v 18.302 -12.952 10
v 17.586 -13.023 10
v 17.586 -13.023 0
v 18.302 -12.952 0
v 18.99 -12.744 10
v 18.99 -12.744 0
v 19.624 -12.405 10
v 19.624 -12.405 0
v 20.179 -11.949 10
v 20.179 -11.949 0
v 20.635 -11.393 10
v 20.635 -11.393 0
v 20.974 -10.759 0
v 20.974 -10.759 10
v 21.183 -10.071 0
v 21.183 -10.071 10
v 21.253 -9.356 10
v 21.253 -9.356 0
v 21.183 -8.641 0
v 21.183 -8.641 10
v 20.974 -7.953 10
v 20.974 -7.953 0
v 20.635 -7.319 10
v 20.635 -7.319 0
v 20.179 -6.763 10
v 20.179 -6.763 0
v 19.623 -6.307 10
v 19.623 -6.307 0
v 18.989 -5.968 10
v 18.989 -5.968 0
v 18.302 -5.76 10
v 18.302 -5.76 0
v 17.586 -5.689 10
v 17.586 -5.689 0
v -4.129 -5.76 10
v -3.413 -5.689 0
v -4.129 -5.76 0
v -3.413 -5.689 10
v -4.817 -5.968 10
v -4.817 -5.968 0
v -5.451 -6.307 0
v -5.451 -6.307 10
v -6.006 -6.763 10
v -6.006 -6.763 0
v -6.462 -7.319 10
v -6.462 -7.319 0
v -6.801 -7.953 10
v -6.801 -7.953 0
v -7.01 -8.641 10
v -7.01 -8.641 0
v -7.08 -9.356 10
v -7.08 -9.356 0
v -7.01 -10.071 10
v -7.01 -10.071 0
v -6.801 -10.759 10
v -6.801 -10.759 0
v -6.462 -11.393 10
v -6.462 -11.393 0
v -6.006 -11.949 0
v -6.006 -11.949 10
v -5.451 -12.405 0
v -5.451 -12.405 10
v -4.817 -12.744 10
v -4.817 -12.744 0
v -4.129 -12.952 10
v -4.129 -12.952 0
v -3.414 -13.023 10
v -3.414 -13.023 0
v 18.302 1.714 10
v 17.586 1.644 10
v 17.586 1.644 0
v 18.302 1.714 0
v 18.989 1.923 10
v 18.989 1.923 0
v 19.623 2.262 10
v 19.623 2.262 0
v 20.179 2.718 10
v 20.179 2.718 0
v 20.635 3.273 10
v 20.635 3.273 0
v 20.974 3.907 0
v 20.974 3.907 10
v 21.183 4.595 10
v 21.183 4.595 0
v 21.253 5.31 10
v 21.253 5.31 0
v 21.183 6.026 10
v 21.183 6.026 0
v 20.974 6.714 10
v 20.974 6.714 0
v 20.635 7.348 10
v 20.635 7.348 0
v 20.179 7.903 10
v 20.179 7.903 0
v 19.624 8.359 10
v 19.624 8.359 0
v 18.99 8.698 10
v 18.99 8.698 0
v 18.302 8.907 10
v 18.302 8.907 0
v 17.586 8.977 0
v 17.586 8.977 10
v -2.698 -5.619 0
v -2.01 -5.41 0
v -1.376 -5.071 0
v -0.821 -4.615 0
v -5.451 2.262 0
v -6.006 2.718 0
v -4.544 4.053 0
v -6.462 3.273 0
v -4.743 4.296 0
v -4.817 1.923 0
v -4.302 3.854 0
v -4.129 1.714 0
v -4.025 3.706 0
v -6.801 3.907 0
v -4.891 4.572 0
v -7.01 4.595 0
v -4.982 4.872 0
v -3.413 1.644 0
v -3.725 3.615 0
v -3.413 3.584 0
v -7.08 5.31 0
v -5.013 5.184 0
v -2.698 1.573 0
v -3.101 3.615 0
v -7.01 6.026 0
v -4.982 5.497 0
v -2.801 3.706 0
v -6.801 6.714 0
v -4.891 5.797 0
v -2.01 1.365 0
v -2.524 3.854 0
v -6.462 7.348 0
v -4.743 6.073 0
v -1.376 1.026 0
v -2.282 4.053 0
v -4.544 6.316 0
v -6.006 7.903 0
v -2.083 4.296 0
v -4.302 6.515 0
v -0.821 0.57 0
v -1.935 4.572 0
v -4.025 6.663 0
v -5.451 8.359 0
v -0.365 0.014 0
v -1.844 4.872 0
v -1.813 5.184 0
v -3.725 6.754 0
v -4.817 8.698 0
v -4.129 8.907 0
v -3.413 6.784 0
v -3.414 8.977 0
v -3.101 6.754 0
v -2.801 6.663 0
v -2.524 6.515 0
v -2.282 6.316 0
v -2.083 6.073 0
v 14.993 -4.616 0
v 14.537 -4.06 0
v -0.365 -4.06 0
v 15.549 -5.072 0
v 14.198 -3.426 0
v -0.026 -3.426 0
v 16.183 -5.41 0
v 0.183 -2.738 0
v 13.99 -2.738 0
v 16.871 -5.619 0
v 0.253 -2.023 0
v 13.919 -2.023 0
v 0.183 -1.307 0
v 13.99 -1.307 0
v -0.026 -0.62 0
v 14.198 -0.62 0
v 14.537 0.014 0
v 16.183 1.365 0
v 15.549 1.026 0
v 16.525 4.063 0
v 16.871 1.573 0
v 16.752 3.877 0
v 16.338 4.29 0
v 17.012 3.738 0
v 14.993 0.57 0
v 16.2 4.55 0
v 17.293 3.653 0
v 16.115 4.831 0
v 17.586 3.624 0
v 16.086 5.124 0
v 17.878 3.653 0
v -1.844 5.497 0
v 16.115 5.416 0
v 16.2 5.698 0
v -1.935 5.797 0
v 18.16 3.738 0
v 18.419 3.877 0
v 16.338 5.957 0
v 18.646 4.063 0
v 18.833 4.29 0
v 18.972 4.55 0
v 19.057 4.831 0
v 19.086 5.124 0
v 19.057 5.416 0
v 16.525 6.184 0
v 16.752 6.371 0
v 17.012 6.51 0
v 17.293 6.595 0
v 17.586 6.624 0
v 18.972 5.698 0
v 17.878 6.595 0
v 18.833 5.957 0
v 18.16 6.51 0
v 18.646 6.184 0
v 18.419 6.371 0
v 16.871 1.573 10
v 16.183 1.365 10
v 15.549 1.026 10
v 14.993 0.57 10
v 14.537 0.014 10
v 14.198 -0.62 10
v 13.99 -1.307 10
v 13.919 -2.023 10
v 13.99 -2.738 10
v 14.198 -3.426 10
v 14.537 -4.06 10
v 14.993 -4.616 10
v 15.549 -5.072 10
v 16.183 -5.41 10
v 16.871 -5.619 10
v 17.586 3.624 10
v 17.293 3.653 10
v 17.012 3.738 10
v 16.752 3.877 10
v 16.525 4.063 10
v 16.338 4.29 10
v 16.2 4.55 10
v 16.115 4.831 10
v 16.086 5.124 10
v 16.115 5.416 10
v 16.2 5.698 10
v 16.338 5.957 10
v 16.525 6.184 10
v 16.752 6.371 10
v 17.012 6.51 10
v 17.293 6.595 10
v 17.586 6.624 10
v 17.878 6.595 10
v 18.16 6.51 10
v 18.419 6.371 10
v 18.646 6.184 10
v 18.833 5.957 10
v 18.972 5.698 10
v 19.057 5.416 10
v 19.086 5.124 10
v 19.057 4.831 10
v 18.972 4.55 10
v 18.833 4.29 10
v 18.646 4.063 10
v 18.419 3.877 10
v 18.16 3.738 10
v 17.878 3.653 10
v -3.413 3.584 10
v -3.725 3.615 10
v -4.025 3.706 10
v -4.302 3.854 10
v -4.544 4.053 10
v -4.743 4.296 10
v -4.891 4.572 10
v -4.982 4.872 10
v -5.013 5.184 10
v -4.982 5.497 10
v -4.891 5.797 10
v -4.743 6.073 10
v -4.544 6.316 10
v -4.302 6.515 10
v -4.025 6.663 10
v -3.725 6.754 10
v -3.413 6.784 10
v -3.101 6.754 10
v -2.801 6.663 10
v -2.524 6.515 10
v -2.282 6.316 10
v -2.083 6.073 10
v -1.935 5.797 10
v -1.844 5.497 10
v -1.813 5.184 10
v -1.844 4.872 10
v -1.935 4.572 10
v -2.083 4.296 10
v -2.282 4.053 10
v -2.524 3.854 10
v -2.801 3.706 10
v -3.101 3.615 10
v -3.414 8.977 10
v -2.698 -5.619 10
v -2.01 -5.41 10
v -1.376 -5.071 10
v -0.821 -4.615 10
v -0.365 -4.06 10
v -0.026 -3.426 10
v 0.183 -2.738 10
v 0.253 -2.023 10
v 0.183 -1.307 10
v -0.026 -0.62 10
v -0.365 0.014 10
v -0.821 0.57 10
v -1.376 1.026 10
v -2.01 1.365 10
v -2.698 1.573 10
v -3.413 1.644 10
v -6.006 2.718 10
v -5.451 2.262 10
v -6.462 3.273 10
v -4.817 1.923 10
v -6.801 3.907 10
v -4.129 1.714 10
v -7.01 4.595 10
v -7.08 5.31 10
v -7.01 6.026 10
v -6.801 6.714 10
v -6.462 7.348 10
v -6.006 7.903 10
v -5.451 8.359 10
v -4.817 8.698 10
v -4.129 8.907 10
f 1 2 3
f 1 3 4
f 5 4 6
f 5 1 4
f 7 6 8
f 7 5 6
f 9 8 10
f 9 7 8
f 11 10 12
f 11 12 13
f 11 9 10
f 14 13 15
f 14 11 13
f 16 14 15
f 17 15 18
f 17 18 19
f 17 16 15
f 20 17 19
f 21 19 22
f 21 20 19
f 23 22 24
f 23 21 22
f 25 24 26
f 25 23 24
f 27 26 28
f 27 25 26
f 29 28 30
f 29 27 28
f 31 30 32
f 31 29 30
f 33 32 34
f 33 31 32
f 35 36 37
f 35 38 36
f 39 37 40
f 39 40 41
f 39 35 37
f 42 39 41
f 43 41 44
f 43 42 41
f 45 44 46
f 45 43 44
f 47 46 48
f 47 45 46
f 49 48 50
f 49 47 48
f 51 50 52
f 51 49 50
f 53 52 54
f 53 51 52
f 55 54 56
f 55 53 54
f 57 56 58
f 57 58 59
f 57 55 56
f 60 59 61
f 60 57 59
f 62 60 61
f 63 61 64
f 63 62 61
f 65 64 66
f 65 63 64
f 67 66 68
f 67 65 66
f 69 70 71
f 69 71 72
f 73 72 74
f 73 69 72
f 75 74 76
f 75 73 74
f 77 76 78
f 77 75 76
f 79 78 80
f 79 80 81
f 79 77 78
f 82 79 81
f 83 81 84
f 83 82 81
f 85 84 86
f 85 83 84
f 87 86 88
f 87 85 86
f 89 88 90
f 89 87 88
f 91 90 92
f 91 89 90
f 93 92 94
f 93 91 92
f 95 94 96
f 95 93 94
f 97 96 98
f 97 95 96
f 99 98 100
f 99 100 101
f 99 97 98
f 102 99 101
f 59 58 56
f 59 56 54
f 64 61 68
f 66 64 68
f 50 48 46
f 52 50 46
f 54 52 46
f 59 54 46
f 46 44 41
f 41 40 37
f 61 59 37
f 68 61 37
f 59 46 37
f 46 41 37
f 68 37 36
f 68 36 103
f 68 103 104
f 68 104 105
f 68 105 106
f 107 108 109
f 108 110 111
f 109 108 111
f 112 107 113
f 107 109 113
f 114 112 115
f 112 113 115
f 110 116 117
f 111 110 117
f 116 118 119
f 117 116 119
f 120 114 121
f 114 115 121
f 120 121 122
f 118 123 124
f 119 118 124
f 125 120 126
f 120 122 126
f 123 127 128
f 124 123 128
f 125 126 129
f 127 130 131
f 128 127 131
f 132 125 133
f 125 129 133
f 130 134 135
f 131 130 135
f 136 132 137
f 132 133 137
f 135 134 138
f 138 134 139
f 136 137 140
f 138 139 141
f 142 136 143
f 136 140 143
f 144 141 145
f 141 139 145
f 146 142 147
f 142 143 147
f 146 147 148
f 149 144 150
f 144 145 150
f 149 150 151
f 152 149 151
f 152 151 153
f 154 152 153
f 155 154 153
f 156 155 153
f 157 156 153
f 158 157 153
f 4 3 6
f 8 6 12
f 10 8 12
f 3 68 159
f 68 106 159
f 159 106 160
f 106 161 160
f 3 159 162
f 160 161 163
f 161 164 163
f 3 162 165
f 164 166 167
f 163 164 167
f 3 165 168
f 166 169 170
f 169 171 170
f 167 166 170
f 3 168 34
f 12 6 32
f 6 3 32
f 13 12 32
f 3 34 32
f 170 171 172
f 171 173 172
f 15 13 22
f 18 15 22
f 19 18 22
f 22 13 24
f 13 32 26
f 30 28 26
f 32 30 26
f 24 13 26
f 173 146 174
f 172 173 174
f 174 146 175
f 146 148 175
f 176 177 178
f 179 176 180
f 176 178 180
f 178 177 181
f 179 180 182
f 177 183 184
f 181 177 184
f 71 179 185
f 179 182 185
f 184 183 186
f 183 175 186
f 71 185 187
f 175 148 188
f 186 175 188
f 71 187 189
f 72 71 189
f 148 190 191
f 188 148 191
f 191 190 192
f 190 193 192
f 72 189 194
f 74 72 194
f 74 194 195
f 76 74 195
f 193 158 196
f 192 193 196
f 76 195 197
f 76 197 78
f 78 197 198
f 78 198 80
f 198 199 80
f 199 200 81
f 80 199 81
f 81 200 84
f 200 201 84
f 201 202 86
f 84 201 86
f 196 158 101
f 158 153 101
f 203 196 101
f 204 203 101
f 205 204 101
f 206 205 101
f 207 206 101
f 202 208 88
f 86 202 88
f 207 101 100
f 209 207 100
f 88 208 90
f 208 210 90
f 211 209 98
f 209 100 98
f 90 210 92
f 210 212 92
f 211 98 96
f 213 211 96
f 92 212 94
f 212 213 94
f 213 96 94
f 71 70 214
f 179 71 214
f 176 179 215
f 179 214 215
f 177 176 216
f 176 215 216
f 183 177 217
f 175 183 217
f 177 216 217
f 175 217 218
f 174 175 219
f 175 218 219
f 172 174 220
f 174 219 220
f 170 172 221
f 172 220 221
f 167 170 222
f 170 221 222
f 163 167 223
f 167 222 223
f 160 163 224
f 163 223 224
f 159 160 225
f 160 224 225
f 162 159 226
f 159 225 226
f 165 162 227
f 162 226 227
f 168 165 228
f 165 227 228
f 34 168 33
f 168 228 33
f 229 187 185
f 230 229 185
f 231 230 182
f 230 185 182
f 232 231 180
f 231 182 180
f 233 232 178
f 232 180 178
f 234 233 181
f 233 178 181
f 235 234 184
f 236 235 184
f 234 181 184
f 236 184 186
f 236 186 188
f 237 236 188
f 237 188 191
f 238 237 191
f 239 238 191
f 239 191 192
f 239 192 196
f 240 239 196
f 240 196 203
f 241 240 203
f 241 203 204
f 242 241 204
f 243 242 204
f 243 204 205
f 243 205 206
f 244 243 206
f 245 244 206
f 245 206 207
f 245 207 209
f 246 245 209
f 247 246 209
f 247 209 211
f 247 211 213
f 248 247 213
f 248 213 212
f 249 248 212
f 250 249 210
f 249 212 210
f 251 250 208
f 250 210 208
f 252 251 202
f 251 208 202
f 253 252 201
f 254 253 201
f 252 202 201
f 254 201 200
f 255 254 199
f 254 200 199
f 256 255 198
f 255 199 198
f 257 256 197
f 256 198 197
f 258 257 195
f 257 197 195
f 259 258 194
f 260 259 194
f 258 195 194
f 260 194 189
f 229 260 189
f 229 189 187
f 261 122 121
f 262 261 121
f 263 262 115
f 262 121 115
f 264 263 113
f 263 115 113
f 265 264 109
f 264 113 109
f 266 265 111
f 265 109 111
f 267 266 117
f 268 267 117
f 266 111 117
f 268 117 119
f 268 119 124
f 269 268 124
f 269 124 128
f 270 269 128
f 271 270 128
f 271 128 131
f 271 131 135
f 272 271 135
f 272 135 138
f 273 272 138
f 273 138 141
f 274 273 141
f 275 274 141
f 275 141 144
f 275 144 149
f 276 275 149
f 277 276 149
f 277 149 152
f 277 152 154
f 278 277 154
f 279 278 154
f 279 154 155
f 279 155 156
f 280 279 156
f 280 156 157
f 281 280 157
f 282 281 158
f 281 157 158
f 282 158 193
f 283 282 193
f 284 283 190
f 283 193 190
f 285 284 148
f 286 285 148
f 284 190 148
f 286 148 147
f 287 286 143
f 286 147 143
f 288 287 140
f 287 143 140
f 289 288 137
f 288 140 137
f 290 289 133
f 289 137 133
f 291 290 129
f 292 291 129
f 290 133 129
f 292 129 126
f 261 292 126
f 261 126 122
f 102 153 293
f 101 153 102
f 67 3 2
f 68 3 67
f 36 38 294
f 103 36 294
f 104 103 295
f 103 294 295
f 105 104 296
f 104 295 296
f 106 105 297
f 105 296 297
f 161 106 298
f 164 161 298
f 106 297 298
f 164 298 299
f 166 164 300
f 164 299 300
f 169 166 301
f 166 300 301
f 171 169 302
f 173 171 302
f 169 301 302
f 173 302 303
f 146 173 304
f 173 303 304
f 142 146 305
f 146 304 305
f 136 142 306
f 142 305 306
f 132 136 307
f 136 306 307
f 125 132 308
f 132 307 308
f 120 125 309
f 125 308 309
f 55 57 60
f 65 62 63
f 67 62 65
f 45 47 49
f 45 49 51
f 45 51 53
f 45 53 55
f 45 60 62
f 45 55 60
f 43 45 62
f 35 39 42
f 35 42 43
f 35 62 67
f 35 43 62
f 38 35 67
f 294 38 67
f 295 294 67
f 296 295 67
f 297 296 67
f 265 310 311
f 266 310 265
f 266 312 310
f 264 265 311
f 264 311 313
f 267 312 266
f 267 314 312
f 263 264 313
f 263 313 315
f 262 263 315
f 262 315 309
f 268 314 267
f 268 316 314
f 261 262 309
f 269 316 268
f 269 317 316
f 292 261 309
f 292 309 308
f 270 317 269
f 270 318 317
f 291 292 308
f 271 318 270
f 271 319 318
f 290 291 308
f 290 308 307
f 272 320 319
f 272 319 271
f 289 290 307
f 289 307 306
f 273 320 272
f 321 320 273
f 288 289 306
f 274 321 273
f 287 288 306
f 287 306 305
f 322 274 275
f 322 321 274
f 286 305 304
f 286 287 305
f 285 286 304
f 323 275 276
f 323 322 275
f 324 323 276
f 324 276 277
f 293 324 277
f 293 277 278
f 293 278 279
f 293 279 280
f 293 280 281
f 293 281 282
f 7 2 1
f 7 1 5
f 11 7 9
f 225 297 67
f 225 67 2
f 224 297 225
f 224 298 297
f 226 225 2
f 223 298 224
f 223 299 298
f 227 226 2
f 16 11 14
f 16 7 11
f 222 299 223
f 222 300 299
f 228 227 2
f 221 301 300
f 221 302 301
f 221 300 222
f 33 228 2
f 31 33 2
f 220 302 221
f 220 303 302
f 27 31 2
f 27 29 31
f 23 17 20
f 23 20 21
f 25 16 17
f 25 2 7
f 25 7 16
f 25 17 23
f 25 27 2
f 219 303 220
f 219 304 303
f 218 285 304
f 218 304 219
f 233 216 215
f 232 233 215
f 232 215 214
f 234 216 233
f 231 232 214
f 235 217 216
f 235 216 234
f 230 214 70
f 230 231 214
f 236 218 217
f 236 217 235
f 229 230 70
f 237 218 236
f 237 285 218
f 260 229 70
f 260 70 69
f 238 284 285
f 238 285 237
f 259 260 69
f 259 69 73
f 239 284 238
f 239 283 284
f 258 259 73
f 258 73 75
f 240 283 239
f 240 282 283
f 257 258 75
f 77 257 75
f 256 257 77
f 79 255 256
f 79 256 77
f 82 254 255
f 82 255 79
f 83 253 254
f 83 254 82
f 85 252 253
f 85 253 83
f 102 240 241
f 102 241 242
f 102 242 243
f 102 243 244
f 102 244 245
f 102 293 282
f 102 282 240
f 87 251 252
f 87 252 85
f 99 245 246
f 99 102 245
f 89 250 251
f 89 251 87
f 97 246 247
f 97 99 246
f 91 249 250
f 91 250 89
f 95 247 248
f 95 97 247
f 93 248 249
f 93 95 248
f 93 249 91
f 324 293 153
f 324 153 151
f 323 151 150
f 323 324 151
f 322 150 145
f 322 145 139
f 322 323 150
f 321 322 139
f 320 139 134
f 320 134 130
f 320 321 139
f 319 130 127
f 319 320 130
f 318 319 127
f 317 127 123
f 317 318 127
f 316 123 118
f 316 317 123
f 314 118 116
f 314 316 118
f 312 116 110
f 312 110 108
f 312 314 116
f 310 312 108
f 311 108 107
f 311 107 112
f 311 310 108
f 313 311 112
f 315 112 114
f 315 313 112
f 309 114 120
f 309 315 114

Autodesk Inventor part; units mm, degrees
ref_plane "YZ Plane" through (0, 0, 0) normal (1, 0, 0) x (0, 1, 0)
ref_plane "XZ Plane" through (0, 0, 0) normal (0, 1, 0) x (-1, 0, 0)
ref_plane "XY Plane" through (0, 0, 0) normal (0, 0, 1) x (1, 0, 0)
sketch "Sketch1" plane through (0, 0, 0) normal (0, 0, 1) x (1, 0, 0)
  line L0 (-13.9136, 8.9772) -> (28.0864, 8.9772)
  line L1 (28.0864, 8.9772) -> (28.0864, -13.0228)
  line L2 (28.0864, -13.0228) -> (-13.9136, -13.0228)
  line L3 (-13.9136, -13.0228) -> (-13.9136, 8.9772)
  point P0 (0, 0)
  dimension "d0" = 42
  dimension "d1" = 22
extrude "Extrusion1" add sketch "Sketch1" along normal blind 10
sketch "Sketch2" plane through (0, 0, 10) normal (0, 0, 1) x (1, 0, 0)
  line L0 (-13.9136, -13.0228) -> (28.0864, -13.0228) projected
  arc A0 (-3.4134, -5.6894) -> (-3.4136, -13.0228) centre (-3.4136, -9.3561) ccw
  arc A1 (-3.4134, -5.6894) -> (-3.4134, 1.6439) centre (-3.4133, -2.0228) ccw
  arc A2 (17.5864, -13.0228) -> (17.5862, -5.6894) centre (17.5864, -9.3561) ccw
  arc A3 (17.5862, 1.6439) -> (17.5862, -5.6894) centre (17.586, -2.0228) ccw
  line L1 (-3.4136, -13.0228) -> (17.5864, -13.0228)
  line L2 (-3.4135, 8.9772) -> (17.5865, 8.9772)
  line L3 (28.0864, 8.9772) -> (-13.9136, 8.9772) projected
  line L4 (-3.4133, -2.0228) -> (-3.4136, -9.3561) construction
  line L5 (17.5864, -9.3561) -> (17.586, -2.0228) construction
  arc A4 (-3.4135, 8.9772) -> (-3.4134, 1.6439) centre (-3.4136, 5.3106) ccw
  arc A5 (17.5862, 1.6439) -> (17.5865, 8.9772) centre (17.5864, 5.3106) ccw
  line L6 (-3.4133, -2.0228) -> (-13.9136, -2.0228) construction
  line L7 (17.586, -2.0228) -> (28.0864, -2.0228) construction
  line L8 (28.0864, -13.0228) -> (28.0864, 8.9772) construction
  line L9 (-13.9136, 8.9772) -> (-13.9136, -13.0228) projected
  line L10 (-7.0803, -9.356) -> (-13.9136, -9.356) construction
  line L11 (21.2531, -9.356) -> (28.0864, -9.356) construction
  line L12 (-13.9136, -13.0228) -> (28.0864, -13.0228)
  line L13 (28.0864, -13.0228) -> (28.0864, 8.9772)
  line L14 (28.0864, 8.9772) -> (-13.9136, 8.9772)
  line L15 (-13.9136, 8.9772) -> (-13.9136, -13.0228)
  line L16 (-7.0803, 5.3105) -> (-13.9136, 5.3105) construction
  line L17 (21.2531, 5.3105) -> (28.0864, 5.3105) construction
  point P0 (0, 0)
  point P1 (17.8152, 8.9772)
  point P2 (-3.4136, 8.9772)
  point P3 (-3.4136, 8.9772)
  dimension "d4" = 21
  dimension "d5" = 22
  dimension "d17" = 21
extrude "Extrusion2" cut sketch "Sketch2" against normal blind 10 contours L9 L3 A4 A1 A0 L0 | A2 A3 A5 L3 L13 L0
sketch "Sketch3" plane through (0, 0, 10) normal (0, 0, 1) x (1, 0, 0)
  arc A0 (-3.4134, -5.6894) -> (-3.4134, 1.6439) centre (-3.4133, -2.0228) ccw construction
  line L0 (-7.2207, -5.6893) -> (3.1864, -5.6897) construction
  line L1 (20.3968, -5.6893) -> (9.686, -5.6898) construction
  arc A1 (-3.4134, -5.6894) -> (-3.4136, -13.0228) centre (-3.4136, -9.3561) ccw construction
  arc A2 (-3.4134, -5.6894) -> (-3.4134, 1.6439) centre (-3.4133, -2.0228) ccw construction
  arc A3 (17.5864, -13.0228) -> (17.5862, -5.6894) centre (17.5864, -9.3561) ccw construction
  arc A4 (17.5862, 1.6439) -> (17.5862, -5.6894) centre (17.586, -2.0228) ccw construction
  line L2 (-3.4137, -11.3763) -> (-3.4129, 5.1845) construction
  line L3 (17.5866, -13.0364) -> (17.5857, 5.1238) construction
  arc A5 (17.5862, 1.6439) -> (17.5862, -5.6894) centre (17.586, -2.0228) ccw construction
  point P0 (0, 0)
hole "Hole1" at (17.5857, 5.1238, 10) direction (0, 0, -1) diameter 3 end through all
hole "Hole2" at (-3.4129, 5.1845, 10) direction (0, 0, -1) diameter 3.2 end through all
properties part number "Zipperteethv7"
